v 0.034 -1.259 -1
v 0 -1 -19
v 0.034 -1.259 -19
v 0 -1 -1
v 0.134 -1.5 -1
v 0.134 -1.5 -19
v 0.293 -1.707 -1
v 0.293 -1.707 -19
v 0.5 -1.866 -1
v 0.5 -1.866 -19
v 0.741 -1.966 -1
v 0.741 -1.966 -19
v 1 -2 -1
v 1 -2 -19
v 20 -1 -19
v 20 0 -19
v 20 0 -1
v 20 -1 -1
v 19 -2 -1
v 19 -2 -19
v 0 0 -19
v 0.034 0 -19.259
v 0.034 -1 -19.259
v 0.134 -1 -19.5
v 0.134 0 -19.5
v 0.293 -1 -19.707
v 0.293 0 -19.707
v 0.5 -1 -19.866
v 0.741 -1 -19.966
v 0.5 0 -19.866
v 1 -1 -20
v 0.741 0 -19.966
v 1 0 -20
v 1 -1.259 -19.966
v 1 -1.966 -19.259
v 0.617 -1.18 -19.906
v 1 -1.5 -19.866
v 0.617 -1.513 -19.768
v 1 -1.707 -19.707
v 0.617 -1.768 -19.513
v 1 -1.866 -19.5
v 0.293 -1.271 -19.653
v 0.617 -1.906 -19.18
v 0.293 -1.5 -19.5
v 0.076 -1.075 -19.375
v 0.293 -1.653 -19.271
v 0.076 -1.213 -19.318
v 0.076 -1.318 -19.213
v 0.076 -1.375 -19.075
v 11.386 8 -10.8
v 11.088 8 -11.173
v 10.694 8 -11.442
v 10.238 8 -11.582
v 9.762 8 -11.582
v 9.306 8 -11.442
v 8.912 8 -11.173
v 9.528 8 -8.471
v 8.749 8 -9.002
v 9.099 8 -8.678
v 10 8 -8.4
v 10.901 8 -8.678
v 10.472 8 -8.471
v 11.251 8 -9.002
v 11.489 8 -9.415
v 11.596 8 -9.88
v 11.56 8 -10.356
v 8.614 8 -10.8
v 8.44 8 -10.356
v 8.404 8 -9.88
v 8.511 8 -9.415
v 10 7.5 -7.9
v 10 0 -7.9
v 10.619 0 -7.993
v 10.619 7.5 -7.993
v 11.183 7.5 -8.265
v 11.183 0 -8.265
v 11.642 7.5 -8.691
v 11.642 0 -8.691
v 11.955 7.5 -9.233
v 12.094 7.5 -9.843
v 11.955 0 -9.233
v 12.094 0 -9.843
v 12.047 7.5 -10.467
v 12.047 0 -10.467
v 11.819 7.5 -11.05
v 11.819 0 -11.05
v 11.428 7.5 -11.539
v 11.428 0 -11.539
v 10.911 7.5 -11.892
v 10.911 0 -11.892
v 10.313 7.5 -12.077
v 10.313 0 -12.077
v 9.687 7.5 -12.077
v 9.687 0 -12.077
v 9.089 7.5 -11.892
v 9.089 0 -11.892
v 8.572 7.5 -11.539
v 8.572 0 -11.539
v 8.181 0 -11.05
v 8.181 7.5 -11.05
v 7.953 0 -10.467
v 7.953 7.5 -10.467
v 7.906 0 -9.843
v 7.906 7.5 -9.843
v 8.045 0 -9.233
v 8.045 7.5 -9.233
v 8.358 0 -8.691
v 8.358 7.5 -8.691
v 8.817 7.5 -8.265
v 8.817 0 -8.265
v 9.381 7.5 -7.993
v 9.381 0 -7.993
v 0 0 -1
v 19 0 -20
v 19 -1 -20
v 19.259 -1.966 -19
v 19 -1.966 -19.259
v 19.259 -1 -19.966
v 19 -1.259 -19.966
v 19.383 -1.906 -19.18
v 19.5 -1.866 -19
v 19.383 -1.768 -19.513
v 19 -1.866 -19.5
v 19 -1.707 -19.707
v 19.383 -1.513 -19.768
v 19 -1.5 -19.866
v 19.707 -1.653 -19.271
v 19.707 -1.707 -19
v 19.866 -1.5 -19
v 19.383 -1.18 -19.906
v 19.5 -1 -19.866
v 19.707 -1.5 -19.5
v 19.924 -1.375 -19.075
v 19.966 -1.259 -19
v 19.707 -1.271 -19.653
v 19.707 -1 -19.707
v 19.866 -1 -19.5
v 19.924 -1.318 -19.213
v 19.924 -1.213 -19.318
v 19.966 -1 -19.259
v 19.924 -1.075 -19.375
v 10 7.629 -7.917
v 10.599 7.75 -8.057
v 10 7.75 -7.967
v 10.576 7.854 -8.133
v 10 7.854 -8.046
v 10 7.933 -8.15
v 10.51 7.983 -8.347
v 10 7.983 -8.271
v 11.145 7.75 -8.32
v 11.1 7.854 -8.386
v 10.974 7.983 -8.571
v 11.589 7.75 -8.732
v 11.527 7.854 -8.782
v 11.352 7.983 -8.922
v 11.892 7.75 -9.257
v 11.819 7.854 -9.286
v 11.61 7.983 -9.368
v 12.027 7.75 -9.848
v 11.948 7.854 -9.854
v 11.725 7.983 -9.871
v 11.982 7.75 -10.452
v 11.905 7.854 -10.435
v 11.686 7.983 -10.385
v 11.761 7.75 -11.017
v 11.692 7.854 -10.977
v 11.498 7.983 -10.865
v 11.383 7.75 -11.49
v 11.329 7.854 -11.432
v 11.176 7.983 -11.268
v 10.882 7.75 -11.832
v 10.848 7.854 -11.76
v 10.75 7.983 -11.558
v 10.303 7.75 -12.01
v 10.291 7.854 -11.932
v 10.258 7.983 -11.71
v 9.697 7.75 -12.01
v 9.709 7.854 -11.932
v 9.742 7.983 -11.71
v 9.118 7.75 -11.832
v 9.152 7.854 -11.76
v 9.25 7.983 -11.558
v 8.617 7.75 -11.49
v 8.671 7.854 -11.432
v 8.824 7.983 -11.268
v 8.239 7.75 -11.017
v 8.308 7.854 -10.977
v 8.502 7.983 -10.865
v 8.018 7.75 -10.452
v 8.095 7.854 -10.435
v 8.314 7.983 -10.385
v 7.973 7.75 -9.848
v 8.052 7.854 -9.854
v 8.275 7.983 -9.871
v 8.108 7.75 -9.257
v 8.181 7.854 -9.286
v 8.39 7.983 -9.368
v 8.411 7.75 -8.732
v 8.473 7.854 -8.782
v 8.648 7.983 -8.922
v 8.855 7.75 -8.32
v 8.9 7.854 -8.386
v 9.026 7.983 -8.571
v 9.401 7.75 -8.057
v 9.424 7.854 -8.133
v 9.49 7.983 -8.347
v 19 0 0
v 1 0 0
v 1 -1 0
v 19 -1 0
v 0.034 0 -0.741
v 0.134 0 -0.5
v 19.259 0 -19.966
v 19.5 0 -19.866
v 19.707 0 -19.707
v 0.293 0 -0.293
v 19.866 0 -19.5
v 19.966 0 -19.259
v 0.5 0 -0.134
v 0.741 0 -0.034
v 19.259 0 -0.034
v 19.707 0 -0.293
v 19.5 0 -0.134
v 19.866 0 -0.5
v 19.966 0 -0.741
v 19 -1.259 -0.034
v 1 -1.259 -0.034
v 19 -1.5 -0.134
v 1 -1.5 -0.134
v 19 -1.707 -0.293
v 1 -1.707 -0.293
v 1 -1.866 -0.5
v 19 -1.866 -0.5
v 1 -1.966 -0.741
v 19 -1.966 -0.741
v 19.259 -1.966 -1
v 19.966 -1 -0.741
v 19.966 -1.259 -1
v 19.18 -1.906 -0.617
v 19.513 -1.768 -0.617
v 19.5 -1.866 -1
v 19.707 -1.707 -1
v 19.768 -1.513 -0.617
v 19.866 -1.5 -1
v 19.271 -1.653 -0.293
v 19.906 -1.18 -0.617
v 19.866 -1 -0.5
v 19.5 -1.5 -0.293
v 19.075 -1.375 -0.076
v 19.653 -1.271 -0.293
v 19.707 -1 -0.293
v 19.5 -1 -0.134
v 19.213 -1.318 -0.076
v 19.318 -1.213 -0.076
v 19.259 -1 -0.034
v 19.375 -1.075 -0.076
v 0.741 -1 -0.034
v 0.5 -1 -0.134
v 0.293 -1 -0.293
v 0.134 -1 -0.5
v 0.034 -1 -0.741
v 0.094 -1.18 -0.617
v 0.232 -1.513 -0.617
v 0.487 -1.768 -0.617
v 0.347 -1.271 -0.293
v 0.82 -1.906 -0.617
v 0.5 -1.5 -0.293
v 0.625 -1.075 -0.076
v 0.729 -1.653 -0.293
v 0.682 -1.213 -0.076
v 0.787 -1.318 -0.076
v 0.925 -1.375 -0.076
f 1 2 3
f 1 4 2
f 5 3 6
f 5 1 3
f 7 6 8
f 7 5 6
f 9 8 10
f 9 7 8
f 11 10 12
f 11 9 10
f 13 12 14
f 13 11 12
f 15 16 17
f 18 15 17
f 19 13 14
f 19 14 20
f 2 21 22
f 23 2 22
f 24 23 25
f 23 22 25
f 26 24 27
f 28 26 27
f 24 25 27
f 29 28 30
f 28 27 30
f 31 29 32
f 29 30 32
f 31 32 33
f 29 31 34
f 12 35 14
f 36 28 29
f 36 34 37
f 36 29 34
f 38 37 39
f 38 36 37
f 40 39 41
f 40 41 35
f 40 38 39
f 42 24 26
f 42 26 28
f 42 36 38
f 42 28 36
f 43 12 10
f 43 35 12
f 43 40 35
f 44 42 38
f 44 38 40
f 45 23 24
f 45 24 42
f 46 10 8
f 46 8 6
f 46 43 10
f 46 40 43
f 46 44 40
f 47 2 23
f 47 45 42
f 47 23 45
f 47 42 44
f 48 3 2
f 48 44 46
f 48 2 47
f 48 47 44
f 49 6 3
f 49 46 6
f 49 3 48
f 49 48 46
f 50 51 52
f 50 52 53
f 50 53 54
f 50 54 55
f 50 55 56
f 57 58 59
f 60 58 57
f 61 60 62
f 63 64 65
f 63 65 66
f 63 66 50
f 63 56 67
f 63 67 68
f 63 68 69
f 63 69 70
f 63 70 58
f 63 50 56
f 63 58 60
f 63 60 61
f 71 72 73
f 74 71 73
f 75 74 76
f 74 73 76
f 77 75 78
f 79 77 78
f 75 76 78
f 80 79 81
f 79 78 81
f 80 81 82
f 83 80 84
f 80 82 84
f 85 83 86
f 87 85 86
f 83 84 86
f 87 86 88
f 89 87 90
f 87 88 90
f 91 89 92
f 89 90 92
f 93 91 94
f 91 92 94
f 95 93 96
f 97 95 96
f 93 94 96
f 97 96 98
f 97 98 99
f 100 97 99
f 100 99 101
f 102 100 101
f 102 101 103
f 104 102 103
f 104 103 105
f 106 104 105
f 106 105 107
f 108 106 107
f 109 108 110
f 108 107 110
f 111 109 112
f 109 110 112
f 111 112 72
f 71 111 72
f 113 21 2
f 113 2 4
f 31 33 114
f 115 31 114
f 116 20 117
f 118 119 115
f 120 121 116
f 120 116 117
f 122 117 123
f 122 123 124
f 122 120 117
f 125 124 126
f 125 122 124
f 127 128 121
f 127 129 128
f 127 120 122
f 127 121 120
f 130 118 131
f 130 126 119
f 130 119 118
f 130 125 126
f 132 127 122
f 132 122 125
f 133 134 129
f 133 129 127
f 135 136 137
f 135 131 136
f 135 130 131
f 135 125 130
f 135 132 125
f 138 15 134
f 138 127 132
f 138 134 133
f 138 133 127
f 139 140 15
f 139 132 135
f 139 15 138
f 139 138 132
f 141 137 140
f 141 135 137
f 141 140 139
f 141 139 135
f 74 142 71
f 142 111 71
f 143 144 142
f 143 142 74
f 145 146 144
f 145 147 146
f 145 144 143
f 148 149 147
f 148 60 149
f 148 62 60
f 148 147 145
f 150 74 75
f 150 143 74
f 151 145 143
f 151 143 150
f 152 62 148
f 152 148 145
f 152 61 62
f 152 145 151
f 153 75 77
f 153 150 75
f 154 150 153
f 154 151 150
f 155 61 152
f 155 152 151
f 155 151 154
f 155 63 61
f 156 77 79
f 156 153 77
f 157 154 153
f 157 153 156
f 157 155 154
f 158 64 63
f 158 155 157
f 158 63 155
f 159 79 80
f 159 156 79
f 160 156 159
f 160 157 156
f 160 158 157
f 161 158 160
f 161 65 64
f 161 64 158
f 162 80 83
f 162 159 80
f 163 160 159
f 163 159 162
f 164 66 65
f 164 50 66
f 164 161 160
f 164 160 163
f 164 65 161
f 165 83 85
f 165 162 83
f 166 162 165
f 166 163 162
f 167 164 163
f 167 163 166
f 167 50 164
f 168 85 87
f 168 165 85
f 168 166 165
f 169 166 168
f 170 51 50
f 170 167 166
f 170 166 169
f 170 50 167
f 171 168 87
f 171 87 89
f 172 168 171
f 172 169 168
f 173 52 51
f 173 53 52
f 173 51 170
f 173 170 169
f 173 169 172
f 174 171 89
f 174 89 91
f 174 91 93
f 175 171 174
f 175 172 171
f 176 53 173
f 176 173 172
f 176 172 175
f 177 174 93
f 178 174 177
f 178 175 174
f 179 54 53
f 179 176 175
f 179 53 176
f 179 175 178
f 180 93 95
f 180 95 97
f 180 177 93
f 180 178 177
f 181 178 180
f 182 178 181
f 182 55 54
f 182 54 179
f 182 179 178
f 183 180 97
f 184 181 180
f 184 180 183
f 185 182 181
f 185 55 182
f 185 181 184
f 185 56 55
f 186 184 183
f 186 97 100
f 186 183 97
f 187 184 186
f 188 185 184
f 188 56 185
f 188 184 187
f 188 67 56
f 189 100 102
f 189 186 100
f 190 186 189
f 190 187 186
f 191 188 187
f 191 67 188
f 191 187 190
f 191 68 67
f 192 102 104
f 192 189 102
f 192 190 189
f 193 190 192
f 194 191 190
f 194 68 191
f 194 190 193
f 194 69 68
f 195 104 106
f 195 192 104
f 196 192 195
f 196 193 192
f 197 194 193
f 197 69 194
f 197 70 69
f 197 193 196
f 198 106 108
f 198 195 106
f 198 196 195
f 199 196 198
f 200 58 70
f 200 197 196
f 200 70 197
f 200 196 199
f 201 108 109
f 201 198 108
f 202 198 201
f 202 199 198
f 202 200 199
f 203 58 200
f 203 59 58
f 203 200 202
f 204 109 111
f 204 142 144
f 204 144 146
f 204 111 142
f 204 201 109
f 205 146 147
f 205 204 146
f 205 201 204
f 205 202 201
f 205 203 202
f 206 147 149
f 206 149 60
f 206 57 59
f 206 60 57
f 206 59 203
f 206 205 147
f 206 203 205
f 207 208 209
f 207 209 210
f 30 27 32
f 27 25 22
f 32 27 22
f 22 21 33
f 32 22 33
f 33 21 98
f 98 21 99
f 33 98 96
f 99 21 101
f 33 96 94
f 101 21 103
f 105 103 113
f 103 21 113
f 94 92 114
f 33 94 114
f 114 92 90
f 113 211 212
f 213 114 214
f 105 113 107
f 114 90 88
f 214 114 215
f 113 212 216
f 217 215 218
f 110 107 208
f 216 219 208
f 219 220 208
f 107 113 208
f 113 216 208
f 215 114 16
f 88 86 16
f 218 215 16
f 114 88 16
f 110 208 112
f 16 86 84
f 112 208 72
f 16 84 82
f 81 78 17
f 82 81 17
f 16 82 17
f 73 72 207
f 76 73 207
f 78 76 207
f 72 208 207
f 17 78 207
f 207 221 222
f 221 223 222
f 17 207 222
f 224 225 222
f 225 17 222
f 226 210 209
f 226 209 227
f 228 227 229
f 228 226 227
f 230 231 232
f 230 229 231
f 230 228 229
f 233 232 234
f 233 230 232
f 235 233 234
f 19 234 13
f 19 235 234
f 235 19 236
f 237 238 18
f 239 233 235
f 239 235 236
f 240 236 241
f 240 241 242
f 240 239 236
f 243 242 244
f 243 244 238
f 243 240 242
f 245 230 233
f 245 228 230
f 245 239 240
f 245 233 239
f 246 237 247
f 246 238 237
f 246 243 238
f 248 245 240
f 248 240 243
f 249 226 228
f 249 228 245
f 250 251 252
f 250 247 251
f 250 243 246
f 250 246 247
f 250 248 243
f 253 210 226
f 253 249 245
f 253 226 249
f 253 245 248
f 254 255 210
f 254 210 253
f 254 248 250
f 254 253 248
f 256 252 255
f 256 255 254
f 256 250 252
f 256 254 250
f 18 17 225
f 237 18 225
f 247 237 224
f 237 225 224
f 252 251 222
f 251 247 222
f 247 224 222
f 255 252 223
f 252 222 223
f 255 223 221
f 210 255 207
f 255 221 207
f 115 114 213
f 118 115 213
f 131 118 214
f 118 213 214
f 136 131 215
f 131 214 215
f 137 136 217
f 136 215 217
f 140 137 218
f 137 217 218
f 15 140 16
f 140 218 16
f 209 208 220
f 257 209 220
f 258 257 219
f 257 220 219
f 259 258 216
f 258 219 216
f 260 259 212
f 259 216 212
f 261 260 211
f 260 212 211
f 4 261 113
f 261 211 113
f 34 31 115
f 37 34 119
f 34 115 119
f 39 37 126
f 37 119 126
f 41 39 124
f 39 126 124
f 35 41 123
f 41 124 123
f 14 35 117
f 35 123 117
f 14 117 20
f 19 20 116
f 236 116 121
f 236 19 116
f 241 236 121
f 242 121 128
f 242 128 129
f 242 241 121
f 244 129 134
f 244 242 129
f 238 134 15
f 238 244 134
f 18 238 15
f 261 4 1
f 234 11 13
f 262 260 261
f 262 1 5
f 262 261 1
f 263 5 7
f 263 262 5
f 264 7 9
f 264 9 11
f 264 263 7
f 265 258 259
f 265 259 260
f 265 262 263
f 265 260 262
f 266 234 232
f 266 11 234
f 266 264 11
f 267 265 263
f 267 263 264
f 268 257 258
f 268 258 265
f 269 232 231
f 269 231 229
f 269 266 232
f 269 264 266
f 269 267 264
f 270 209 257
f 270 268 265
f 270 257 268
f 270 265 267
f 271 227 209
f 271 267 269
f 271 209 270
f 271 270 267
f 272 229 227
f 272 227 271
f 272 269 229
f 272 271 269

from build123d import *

# Parameters (mm, degrees)
SKETCH1_R           = 2.1
BOSS_EXTRUDE1_DEPTH = 8
SKETCH2_W           = 20
SKETCH2_H           = 20
BOSS_EXTRUDE2_DEPTH = 2
FILLET1_R           = 1
FILLET2_R           = 0.5
FILLET3_R           = 1


with BuildPart() as part:
    # Sketch1 → Boss-Extrude1 (new body)
    with BuildSketch(Plane(origin=(0, 0, 0), x_dir=(1, 0, 0), z_dir=(0, 1, 0))):
        with Locations(Location((10, 10, 0), (0, 0, 270))):
            Circle(SKETCH1_R)
    extrude(amount=BOSS_EXTRUDE1_DEPTH)

    # Sketch2 → Boss-Extrude2 (add)
    with BuildSketch(Plane.XZ):
        with Locations((10, -10)):
            Rectangle(SKETCH2_W, SKETCH2_H)
    extrude(amount=BOSS_EXTRUDE2_DEPTH)

    # Fillet1
    fillet1_edges = [part.edges().sort_by_distance(p)[0] for p in [
        (0, -2, -10),
        (10, -2, -20),
        (20, -2, -10),
        (10, -2, 0),
    ]]
    fillet(fillet1_edges, radius=FILLET1_R)

    # Fillet2
    fillet2_edges = [part.edges().sort_by_distance(p)[0] for p in [
        (10, 8, -12.1),
    ]]
    fillet(fillet2_edges, radius=FILLET2_R)

    # Fillet3
    # the kernel refuses this fillet: 1 mm, written as the material it takes off along each edge
    with BuildSketch(Plane(origin=(19, -1, -19), x_dir=(0, 0, -1), z_dir=(1, 0, 0))) as fillet3_piece_1_section:
        Polygon((0, 0), (FILLET3_R, 0), (FILLET3_R, -FILLET3_R), (0, -FILLET3_R), align=None)
    fillet3_piece_1 = extrude(amount=FILLET3_R, mode=Mode.PRIVATE)
    fillet3_piece_1 = fillet3_piece_1 - Plane(origin=(19, -1, -19), x_dir=(0, 0.7071067811865475, 0.7071067811865475), z_dir=(1, 0, 0)) * Sphere(FILLET3_R, mode=Mode.PRIVATE)
    add(fillet3_piece_1, mode=Mode.SUBTRACT)
    with BuildSketch(Plane(origin=(1, -1, -19), x_dir=(0, 0, -1), z_dir=(-1, 0, 0))) as fillet3_piece_2_section:
        Polygon((0, 0), (FILLET3_R, 0), (FILLET3_R, FILLET3_R), (0, FILLET3_R), align=None)
    fillet3_piece_2 = extrude(amount=FILLET3_R, mode=Mode.PRIVATE)
    fillet3_piece_2 = fillet3_piece_2 - Plane(origin=(1, -1, -19), x_dir=(0, 0.7071067811865475, 0.7071067811865475), z_dir=(-1, 0, 0)) * Sphere(FILLET3_R, mode=Mode.PRIVATE)
    add(fillet3_piece_2, mode=Mode.SUBTRACT)
    with BuildSketch(Plane(origin=(19, -1, -1), x_dir=(1, 0, 0), z_dir=(0, 0, 1))) as fillet3_piece_3_section:
        Polygon((0, 0), (FILLET3_R, 0), (FILLET3_R, -FILLET3_R), (0, -FILLET3_R), align=None)
    fillet3_piece_3 = extrude(amount=FILLET3_R, mode=Mode.PRIVATE)
    fillet3_piece_3 = fillet3_piece_3 - Plane(origin=(19, -1, -1), x_dir=(-0.7071067811865475, 0.7071067811865475, 0), z_dir=(0, 0, 1)) * Sphere(FILLET3_R, mode=Mode.PRIVATE)
    add(fillet3_piece_3, mode=Mode.SUBTRACT)
    with BuildSketch(Plane(origin=(1, -1, -1), x_dir=(-1, 0, 0), z_dir=(0, 0, 1))) as fillet3_piece_4_section:
        Polygon((0, 0), (FILLET3_R, 0), (FILLET3_R, FILLET3_R), (0, FILLET3_R), align=None)
    fillet3_piece_4 = extrude(amount=FILLET3_R, mode=Mode.PRIVATE)
    fillet3_piece_4 = fillet3_piece_4 - Plane(origin=(1, -1, -1), x_dir=(0.7071067811865475, 0.7071067811865475, 0), z_dir=(0, 0, 1)) * Sphere(FILLET3_R, mode=Mode.PRIVATE)
    add(fillet3_piece_4, mode=Mode.SUBTRACT)
    with BuildSketch(Plane(origin=(0, 2.5, 0), x_dir=(1, 0, 0), z_dir=(0, -1, 0)), Plane(origin=(0, 2.5, -20), x_dir=(0, 0, 1), z_dir=(0, -1, 0))) as fillet3_piece_5:
        with BuildLine():
            CenterArc((FILLET3_R, -FILLET3_R), FILLET3_R, 90, 90)
            Line((0, -FILLET3_R), (0, 0))
            Line((0, 0), (FILLET3_R, 0))
        make_face()
    extrude(amount=3.5, mode=Mode.SUBTRACT)
    with BuildSketch(Plane(origin=(20, 2.5, 0), x_dir=(-1, 0, 0), z_dir=(0, -1, 0)), Plane(origin=(20, 2.5, -20), x_dir=(0, 0, 1), z_dir=(0, -1, 0))) as fillet3_piece_6:
        with BuildLine():
            CenterArc((FILLET3_R, FILLET3_R), FILLET3_R, 180, 90)
            Line((0, FILLET3_R), (0, 0))
            Line((0, 0), (FILLET3_R, 0))
        make_face()
    extrude(amount=3.5, mode=Mode.SUBTRACT)


solid = part.part
